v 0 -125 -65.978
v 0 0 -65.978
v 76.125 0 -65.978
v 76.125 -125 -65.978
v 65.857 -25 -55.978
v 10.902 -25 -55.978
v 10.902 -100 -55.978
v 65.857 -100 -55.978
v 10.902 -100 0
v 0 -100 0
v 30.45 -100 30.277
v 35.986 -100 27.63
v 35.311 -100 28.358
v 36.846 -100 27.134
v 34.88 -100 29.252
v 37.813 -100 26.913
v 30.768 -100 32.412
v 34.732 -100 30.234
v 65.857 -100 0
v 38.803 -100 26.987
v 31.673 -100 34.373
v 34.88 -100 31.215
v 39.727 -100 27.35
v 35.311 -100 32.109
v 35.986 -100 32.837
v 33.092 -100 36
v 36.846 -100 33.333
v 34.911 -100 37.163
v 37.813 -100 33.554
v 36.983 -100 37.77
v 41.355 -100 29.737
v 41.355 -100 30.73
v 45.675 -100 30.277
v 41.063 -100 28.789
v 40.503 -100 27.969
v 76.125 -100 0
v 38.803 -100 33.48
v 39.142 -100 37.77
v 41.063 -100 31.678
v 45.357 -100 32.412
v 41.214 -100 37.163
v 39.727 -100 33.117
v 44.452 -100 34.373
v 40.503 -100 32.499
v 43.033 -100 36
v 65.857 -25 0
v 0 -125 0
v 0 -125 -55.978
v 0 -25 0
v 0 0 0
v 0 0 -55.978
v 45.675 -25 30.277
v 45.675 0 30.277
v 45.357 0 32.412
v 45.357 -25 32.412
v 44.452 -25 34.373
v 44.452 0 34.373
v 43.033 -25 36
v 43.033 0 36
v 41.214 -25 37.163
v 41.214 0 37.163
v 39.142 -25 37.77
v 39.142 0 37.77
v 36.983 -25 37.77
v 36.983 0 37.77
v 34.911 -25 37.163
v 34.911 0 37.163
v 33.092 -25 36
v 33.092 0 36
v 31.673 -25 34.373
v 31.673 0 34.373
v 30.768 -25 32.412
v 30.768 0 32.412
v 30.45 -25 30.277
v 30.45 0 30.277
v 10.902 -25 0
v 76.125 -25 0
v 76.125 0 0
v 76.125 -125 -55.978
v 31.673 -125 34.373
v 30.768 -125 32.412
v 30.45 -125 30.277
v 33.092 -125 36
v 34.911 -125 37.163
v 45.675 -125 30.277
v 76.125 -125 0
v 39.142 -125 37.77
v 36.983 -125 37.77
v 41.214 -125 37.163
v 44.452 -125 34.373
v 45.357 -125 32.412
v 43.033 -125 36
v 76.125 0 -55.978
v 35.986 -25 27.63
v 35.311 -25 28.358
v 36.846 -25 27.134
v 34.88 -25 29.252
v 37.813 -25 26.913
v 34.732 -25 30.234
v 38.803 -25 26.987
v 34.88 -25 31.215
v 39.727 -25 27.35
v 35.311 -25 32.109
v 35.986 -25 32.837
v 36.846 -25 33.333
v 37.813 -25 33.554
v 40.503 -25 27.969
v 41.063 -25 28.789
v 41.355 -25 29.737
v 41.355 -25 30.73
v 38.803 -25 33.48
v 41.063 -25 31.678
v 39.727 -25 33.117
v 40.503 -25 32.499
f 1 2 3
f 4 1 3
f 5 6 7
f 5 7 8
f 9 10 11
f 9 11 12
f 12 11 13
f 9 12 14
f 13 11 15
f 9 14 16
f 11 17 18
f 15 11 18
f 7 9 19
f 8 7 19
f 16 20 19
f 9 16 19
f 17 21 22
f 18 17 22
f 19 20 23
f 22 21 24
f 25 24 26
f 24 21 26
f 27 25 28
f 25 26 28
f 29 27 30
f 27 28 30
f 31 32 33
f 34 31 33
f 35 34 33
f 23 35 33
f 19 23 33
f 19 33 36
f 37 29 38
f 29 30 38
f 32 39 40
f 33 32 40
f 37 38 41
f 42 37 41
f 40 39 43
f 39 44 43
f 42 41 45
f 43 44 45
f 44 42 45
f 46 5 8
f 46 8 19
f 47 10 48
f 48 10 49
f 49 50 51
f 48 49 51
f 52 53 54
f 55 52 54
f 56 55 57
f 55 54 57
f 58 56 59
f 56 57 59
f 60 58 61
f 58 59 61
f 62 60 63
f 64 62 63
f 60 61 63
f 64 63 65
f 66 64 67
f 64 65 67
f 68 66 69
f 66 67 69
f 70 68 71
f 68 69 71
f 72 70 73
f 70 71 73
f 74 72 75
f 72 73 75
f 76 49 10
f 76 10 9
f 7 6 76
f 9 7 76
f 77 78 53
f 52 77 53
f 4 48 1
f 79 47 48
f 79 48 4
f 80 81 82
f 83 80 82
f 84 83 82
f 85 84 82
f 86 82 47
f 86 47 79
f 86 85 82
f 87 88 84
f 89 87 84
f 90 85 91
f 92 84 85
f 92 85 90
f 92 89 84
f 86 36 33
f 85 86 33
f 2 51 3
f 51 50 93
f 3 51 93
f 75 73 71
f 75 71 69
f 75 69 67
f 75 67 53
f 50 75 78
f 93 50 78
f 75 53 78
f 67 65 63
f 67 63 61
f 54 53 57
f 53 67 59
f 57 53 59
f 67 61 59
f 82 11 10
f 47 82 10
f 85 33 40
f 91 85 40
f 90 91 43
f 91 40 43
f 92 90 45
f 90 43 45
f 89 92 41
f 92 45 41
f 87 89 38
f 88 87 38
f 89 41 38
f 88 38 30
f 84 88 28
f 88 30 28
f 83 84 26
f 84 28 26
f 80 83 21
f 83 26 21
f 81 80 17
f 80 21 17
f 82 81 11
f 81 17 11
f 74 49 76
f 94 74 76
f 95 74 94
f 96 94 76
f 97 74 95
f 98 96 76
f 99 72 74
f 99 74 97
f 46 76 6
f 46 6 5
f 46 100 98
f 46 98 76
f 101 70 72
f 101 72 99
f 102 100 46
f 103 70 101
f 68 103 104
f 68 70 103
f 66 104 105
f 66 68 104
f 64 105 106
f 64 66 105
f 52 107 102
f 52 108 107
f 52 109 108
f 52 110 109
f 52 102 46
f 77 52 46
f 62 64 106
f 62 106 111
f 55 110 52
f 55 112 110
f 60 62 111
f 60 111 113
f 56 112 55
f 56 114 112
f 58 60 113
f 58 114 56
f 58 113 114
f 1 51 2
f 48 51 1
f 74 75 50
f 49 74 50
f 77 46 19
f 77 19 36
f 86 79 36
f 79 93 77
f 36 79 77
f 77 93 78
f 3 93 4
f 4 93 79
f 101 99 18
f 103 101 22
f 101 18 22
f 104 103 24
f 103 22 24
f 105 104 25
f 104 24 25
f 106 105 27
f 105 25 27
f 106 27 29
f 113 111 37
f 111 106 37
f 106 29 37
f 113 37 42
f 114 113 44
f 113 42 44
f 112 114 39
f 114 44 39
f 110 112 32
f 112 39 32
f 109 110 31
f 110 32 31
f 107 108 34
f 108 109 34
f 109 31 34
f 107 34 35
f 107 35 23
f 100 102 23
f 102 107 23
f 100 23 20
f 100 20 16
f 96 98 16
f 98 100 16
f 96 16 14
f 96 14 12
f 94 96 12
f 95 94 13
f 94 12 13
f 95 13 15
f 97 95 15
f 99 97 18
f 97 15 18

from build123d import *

# Parameters (mm, degrees)
F1_DEPTH = 25
F2_W     = 10.90179
F2_H     = 55.97822
F2_W_2   = 10.267794
F3_DEPTH = 75
F5_DEPTH = 25
F6_R     = 3.32997
F7_DEPTH = 89.4
F8_W     = 76.124623
F8_H     = 125
F9_DEPTH = 10


with BuildPart() as f1:
    # F0 (on Front) → F1 (new body)
    with BuildSketch(Plane.XZ):
        with BuildLine():
            Line((30.449602, 30.27692), (0, 0))
            Line((0, 0), (38.062312, 0))
            Line((38.062312, 0), (76.124623, 0))
            Line((76.124623, 0), (45.675021, 30.27692))
            ThreePointArc((45.675021, 30.27692), (38.062312, 37.846457), (30.449602, 30.27692))
        make_face()
        Polygon((38.062312, 0), (0, 0), (0, -55.97822), (76.124623, -55.97822), (76.124623, 0), align=None)
    extrude(amount=F1_DEPTH)

    # F2 (on face) → F3 (join)
    with BuildSketch(Plane.XZ.offset(25)):
        with Locations((5.450895, -27.98911)):
            Rectangle(F2_W, F2_H)
        with Locations((70.990726, -27.98911)):
            Rectangle(F2_W_2, F2_H)
    extrude(amount=F3_DEPTH)

    # F4 (on face) → F5 (join)
    with BuildSketch(Plane.XZ.offset(100)):
        with BuildLine():
            Line((30.449602, 30.27692), (0, 0))
            Line((0, 0), (38.062312, 0))
            Line((38.062312, 0), (76.124623, 0))
            Line((76.124623, 0), (45.675021, 30.27692))
            ThreePointArc((45.675021, 30.27692), (38.062312, 37.846457), (30.449602, 30.27692))
        make_face()
        Polygon((38.062312, 0), (0, 0), (0, -55.97822), (76.124623, -55.97822), (76.124623, 0), align=None)
    extrude(amount=F5_DEPTH)

    # F6 (on face) → F7 (join)
    with BuildSketch(Plane(origin=(0, -100, 0), x_dir=(-1, 0, 0), z_dir=(0, 1, 0))):
        with Locations((-38.062312, 30.233625)):
            Circle(F6_R)
    extrude(amount=F7_DEPTH)

    # F8 (on face) → F9 (join)
    with BuildSketch(Plane(origin=(0, 0, -55.97822), x_dir=(1, 0, 0), z_dir=(0, 0, -1))):
        with Locations((38.062311, 62.5)):
            Rectangle(F8_W, F8_H)
    extrude(amount=F9_DEPTH)


solid = f1.part
